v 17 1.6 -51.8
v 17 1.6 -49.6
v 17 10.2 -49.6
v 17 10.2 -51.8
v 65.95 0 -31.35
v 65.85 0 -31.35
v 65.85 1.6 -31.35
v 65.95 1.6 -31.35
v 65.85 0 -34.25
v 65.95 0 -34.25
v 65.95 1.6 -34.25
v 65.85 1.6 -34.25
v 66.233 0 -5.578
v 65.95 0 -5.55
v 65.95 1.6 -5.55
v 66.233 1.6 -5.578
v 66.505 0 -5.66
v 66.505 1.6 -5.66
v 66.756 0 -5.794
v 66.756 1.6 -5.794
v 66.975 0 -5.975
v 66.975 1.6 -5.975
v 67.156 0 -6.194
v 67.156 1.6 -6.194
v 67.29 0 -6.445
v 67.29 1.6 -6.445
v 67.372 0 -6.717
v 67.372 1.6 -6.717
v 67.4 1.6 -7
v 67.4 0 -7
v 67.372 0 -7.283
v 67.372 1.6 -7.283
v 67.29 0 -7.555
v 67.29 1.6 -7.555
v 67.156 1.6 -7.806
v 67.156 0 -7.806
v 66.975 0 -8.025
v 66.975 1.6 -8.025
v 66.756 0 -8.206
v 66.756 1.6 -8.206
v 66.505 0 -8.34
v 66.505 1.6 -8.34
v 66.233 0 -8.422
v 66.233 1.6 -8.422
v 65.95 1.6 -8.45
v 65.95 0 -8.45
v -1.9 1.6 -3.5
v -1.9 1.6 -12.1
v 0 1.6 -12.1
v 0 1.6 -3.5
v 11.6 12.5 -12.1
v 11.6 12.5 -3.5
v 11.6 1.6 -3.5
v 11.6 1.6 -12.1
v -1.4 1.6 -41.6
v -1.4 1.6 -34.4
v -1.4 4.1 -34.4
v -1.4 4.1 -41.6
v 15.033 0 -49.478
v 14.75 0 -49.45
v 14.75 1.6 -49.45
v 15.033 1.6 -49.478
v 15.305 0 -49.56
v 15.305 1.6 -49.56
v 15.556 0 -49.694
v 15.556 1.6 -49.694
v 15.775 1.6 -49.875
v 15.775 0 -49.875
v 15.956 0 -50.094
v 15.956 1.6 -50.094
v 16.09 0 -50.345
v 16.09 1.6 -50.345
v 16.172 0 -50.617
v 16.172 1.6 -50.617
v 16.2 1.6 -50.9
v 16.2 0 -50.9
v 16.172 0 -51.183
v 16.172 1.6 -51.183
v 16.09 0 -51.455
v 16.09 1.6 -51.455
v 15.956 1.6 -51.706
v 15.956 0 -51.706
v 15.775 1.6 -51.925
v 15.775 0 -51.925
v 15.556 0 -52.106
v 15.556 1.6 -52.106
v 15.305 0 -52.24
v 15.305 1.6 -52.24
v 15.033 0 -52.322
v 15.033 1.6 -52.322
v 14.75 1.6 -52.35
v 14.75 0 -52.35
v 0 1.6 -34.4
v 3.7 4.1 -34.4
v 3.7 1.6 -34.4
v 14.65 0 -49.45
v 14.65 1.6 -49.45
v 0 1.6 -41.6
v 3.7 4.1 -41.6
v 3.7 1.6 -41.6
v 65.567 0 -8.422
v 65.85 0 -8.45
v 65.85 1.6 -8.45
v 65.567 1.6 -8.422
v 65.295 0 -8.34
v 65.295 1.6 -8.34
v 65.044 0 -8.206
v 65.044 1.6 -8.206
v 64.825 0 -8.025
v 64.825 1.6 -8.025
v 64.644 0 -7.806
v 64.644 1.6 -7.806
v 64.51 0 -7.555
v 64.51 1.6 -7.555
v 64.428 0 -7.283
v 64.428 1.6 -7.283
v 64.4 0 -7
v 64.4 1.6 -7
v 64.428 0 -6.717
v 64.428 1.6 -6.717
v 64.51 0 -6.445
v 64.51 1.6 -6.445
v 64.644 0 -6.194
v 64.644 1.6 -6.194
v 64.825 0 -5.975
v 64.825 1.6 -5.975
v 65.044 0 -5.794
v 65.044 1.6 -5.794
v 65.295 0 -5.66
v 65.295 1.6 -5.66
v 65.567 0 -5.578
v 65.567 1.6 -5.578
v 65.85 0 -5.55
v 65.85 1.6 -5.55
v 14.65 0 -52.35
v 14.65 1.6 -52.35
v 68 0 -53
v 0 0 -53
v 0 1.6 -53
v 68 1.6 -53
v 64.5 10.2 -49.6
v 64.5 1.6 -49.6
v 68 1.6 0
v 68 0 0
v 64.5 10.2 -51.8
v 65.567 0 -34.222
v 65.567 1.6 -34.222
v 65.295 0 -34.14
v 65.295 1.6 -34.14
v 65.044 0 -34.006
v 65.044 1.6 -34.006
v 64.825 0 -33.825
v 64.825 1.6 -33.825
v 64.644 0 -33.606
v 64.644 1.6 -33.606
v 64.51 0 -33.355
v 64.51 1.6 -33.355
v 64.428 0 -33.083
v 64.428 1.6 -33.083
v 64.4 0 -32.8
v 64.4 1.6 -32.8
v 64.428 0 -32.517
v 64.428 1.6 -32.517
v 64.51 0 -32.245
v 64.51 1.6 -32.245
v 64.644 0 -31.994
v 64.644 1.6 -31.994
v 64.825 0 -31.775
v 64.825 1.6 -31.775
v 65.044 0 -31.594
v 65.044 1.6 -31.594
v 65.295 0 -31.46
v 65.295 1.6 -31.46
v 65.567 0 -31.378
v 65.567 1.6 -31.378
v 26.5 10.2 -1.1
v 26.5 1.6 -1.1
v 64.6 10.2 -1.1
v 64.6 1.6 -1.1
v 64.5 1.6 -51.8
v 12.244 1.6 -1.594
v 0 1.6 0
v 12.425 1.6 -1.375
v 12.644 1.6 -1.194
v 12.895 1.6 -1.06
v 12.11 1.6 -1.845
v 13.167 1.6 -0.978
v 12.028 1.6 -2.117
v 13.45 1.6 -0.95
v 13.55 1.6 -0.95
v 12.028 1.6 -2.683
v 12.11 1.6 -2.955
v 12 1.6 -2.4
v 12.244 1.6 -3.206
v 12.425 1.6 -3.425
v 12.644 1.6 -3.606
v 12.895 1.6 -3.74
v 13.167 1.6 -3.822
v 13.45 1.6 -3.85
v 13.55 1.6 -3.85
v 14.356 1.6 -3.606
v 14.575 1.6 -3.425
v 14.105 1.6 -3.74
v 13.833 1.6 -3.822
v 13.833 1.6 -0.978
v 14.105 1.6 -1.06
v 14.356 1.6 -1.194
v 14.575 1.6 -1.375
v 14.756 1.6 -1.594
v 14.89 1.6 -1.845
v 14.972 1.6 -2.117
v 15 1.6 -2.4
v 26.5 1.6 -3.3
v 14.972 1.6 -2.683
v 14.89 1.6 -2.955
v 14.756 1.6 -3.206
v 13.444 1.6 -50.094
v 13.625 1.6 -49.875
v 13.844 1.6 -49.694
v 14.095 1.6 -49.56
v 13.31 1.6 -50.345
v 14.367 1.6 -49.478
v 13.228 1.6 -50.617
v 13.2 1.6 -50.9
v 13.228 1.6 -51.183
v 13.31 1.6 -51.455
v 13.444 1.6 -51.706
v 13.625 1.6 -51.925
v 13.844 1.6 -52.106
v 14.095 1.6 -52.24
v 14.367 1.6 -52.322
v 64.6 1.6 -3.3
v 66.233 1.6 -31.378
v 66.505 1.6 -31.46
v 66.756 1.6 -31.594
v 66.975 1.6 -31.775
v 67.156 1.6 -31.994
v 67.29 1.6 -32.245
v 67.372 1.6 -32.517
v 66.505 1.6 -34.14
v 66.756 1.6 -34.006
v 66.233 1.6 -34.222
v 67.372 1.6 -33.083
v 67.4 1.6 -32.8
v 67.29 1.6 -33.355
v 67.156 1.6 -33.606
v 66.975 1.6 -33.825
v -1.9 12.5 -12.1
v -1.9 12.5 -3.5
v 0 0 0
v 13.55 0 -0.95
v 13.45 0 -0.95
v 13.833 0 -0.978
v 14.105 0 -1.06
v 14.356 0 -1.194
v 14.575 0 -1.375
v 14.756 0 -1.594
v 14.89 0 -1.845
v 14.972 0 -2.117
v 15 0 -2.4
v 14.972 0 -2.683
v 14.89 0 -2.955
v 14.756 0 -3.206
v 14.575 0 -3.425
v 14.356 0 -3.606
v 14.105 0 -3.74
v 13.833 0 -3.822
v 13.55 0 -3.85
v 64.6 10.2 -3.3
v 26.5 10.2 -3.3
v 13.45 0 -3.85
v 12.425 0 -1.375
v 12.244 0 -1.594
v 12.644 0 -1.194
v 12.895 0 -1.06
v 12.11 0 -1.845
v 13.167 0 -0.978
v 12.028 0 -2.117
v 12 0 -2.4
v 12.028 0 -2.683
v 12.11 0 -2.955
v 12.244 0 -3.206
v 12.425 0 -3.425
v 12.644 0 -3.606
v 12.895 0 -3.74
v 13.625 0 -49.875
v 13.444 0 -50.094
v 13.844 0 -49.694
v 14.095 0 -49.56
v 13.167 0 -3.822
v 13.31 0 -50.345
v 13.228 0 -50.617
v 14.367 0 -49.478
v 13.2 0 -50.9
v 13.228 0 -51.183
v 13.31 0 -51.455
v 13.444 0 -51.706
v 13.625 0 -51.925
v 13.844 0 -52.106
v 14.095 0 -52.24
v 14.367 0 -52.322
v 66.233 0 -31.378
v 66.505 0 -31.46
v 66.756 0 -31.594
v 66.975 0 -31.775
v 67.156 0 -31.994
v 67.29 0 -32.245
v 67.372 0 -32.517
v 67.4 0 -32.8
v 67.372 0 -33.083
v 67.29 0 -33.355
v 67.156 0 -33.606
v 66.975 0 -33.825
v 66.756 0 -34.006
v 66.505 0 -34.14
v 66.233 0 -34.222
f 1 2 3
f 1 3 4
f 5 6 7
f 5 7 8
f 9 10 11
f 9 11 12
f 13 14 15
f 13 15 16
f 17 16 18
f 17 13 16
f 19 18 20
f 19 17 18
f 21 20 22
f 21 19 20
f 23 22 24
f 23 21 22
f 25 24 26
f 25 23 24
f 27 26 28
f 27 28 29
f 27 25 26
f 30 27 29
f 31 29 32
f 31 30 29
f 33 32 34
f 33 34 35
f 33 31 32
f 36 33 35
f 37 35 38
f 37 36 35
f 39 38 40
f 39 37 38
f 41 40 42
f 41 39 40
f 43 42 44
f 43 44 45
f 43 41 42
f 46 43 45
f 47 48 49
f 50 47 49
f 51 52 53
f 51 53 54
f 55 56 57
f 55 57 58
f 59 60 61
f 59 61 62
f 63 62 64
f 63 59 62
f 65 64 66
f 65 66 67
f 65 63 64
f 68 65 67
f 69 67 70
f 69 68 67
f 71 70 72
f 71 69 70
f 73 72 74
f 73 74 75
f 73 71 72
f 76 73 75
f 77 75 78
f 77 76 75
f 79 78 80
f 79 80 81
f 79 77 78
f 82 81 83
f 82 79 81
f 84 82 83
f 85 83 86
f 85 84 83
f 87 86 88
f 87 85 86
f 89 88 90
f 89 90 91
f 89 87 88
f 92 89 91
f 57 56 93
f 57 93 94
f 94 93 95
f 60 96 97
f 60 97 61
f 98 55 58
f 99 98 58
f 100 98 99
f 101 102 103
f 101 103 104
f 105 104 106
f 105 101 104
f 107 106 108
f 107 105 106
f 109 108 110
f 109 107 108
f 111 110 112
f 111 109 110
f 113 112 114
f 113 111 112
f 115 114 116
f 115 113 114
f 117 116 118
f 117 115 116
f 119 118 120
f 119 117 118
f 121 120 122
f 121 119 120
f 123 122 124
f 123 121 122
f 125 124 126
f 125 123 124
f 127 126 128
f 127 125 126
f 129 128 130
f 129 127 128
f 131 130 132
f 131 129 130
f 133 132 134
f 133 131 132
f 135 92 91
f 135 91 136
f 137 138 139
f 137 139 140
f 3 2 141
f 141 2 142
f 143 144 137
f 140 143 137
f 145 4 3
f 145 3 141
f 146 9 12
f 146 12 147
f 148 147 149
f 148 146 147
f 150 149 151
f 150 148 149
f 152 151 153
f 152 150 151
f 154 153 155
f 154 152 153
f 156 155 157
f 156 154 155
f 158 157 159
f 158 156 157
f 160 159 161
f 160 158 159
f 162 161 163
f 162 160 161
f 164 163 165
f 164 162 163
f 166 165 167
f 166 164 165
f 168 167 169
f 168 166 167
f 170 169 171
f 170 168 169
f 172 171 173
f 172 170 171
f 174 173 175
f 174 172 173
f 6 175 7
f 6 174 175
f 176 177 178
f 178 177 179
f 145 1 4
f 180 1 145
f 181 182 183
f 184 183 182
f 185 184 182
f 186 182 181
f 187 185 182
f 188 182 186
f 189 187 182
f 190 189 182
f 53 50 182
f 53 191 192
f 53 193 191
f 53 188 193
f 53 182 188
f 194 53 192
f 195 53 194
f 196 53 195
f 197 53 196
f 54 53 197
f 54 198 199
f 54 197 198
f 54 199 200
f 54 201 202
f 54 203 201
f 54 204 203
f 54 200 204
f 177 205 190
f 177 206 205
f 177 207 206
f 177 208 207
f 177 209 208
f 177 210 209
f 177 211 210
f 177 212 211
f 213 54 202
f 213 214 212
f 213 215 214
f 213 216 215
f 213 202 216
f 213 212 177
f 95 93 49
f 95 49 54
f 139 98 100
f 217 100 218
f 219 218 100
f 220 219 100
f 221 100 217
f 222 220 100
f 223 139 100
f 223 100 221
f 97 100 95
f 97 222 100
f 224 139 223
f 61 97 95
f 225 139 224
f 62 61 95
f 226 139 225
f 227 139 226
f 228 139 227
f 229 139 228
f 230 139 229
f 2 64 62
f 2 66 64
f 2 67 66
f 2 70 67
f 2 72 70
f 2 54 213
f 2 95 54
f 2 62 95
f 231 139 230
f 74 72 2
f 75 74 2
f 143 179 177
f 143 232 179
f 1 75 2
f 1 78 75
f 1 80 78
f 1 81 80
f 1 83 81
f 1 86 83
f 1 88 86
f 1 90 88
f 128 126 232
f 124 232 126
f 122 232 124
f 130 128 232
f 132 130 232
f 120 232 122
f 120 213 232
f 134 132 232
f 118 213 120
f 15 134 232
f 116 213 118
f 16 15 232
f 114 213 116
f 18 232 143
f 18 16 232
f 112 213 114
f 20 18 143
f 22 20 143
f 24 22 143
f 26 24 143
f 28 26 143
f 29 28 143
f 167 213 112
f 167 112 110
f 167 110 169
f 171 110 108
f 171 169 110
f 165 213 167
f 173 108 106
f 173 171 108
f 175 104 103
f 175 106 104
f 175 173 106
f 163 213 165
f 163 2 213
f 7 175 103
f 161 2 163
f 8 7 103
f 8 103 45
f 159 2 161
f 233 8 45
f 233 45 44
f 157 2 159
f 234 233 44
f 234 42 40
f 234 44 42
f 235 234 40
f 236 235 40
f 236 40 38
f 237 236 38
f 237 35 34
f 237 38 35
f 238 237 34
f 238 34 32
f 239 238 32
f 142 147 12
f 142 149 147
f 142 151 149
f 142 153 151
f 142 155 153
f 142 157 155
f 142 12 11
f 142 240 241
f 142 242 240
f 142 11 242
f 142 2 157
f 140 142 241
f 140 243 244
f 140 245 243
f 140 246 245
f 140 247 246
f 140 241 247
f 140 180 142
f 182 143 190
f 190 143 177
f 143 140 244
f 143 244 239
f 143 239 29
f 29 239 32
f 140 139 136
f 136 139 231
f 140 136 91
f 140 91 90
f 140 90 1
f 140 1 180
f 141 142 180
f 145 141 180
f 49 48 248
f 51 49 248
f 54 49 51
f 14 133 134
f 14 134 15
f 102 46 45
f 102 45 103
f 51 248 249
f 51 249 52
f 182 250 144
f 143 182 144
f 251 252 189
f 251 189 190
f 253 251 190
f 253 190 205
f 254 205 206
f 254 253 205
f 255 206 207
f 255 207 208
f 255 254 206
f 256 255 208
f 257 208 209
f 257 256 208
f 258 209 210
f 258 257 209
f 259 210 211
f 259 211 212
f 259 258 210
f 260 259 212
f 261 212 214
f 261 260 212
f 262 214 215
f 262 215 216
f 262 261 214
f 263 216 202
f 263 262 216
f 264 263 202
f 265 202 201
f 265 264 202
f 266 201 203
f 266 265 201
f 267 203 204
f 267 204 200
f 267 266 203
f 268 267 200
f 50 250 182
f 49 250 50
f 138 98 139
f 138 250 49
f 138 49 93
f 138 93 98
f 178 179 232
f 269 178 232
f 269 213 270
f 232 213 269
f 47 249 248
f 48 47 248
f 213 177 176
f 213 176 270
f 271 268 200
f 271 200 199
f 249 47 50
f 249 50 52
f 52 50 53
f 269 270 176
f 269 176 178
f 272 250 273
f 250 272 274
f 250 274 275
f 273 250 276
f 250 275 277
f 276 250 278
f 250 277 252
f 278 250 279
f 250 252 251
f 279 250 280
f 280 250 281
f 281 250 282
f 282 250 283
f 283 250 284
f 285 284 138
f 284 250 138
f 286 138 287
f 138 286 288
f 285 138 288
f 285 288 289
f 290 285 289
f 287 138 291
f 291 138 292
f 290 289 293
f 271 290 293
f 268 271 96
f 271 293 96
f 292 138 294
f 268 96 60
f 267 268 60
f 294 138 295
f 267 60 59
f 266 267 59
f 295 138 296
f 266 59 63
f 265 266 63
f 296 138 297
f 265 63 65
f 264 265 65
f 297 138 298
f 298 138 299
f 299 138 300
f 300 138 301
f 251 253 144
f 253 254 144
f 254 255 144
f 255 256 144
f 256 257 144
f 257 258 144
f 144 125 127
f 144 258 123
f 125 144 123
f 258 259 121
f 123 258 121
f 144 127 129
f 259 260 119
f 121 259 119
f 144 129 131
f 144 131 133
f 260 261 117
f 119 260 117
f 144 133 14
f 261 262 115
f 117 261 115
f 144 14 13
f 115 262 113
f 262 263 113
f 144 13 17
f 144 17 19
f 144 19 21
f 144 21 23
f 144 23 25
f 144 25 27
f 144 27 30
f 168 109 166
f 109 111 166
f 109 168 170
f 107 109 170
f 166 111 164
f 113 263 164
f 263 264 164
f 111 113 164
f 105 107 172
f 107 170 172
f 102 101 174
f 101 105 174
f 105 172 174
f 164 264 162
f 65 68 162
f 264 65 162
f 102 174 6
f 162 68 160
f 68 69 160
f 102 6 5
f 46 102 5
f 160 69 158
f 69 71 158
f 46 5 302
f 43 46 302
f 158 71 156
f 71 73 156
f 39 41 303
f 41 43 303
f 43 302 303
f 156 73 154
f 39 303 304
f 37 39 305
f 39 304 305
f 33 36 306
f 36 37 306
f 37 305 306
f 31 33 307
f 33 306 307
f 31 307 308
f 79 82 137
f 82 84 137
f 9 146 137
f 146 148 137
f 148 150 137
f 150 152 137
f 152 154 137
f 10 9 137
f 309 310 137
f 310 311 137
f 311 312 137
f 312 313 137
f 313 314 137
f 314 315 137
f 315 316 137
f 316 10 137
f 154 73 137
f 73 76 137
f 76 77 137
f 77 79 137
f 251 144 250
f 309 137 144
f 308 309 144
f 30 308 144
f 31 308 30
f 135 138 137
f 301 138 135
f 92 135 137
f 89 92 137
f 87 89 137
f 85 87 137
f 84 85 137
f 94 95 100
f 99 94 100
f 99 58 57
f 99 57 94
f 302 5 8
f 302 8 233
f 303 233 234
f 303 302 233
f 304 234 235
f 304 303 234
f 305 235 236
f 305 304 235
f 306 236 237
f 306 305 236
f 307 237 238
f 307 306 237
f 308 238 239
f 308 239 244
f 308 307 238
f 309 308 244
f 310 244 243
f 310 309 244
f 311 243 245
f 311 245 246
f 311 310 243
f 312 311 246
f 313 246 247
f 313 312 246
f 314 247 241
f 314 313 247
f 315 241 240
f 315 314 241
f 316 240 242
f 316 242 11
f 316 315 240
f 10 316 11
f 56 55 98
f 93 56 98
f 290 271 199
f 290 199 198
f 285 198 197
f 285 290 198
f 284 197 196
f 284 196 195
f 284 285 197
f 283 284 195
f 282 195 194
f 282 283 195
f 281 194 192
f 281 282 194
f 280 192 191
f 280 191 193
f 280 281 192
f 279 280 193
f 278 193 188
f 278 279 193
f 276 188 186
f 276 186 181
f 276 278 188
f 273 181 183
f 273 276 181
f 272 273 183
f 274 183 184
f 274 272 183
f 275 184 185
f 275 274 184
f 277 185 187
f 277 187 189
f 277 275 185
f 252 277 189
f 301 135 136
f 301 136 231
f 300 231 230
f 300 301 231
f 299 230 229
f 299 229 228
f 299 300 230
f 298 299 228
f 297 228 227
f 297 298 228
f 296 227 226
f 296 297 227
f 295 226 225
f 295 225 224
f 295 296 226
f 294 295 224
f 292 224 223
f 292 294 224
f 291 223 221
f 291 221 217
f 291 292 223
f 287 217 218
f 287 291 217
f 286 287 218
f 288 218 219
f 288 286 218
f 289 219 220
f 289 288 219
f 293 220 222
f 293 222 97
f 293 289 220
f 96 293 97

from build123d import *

# Parameters (mm, degrees)
SKETCH1_W                  = 68
SKETCH1_H                  = 53
BOSS_EXTRUDE1_DEPTH        = 1.6
M2_5_CLEARANCE_SLOT1_DEPTH = 1.6
SKETCH4_W                  = 47.5
SKETCH4_H                  = 2.2
SKETCH4_W_2                = 38.1
BOSS_EXTRUDE2_DEPTH        = 8.6
SKETCH5_W                  = 13.5
SKETCH5_H                  = 8.6
BOSS_EXTRUDE3_DEPTH        = 10.9
SKETCH6_W                  = 5.1
SKETCH6_H                  = 7.2
BOSS_EXTRUDE4_DEPTH        = 2.5


# Read off the part's stored shape, not the designer's step: M2.5 Clearance Slot1
with BuildPart() as part:
    # Sketch1 → Boss-Extrude1 (new body)
    with BuildSketch(Plane(origin=(0, 0, 0), x_dir=(1, 0, 0), z_dir=(0, 1, 0))):
        with Locations((34, 26.5)):
            Rectangle(SKETCH1_W, SKETCH1_H)
    extrude(amount=BOSS_EXTRUDE1_DEPTH)

    # M2.5 Clearance Slot1 outline → M2.5 Clearance Slot1 (cut)
    with BuildSketch(Plane(origin=(0, 0, 0), x_dir=(1, 0, 0), z_dir=(0, 1, 0))):
        with BuildLine():
            Line((14.65, 49.45), (14.75, 49.45))
            ThreePointArc((14.75, 49.45), (16.2, 50.9), (14.75, 52.35))
            Line((14.75, 52.35), (14.65, 52.35))
            ThreePointArc((14.65, 52.35), (13.2, 50.9), (14.65, 49.45))
        make_face()
        with BuildLine():
            Line((65.85, 31.35), (65.95, 31.35))
            ThreePointArc((65.95, 31.35), (67.4, 32.8), (65.95, 34.25))
            Line((65.95, 34.25), (65.85, 34.25))
            ThreePointArc((65.85, 34.25), (64.4, 32.8), (65.85, 31.35))
        make_face()
        with BuildLine():
            Line((65.85, 5.55), (65.95, 5.55))
            ThreePointArc((65.95, 5.55), (67.4, 7), (65.95, 8.45))
            Line((65.95, 8.45), (65.85, 8.45))
            ThreePointArc((65.85, 8.45), (64.4, 7), (65.85, 5.55))
        make_face()
        with BuildLine():
            Line((13.45, 0.95), (13.55, 0.95))
            ThreePointArc((13.55, 0.95), (15, 2.4), (13.55, 3.85))
            Line((13.55, 3.85), (13.45, 3.85))
            ThreePointArc((13.45, 3.85), (12, 2.4), (13.45, 0.95))
        make_face()
    extrude(amount=M2_5_CLEARANCE_SLOT1_DEPTH, mode=Mode.SUBTRACT)

    # Sketch4 → Boss-Extrude2 (add)
    with BuildSketch(Plane(origin=(0, 1.6, 0), x_dir=(1, 0, 0), z_dir=(0, 1, 0))):
        with Locations((40.75, 50.7)):
            Rectangle(SKETCH4_W, SKETCH4_H)
        with Locations((45.55, 2.2)):
            Rectangle(SKETCH4_W_2, SKETCH4_H)
    extrude(amount=BOSS_EXTRUDE2_DEPTH)

    # Sketch5 → Boss-Extrude3 (add)
    with BuildSketch(Plane(origin=(0, 1.6, 0), x_dir=(1, 0, 0), z_dir=(0, 1, 0))):
        with Locations((4.85, 7.8)):
            Rectangle(SKETCH5_W, SKETCH5_H)
    extrude(amount=BOSS_EXTRUDE3_DEPTH)

    # Sketch6 → Boss-Extrude4 (add)
    with BuildSketch(Plane(origin=(0, 1.6, 0), x_dir=(1, 0, 0), z_dir=(0, 1, 0))):
        with Locations((1.15, 38)):
            Rectangle(SKETCH6_W, SKETCH6_H)
    extrude(amount=BOSS_EXTRUDE4_DEPTH)


solid = part.part
